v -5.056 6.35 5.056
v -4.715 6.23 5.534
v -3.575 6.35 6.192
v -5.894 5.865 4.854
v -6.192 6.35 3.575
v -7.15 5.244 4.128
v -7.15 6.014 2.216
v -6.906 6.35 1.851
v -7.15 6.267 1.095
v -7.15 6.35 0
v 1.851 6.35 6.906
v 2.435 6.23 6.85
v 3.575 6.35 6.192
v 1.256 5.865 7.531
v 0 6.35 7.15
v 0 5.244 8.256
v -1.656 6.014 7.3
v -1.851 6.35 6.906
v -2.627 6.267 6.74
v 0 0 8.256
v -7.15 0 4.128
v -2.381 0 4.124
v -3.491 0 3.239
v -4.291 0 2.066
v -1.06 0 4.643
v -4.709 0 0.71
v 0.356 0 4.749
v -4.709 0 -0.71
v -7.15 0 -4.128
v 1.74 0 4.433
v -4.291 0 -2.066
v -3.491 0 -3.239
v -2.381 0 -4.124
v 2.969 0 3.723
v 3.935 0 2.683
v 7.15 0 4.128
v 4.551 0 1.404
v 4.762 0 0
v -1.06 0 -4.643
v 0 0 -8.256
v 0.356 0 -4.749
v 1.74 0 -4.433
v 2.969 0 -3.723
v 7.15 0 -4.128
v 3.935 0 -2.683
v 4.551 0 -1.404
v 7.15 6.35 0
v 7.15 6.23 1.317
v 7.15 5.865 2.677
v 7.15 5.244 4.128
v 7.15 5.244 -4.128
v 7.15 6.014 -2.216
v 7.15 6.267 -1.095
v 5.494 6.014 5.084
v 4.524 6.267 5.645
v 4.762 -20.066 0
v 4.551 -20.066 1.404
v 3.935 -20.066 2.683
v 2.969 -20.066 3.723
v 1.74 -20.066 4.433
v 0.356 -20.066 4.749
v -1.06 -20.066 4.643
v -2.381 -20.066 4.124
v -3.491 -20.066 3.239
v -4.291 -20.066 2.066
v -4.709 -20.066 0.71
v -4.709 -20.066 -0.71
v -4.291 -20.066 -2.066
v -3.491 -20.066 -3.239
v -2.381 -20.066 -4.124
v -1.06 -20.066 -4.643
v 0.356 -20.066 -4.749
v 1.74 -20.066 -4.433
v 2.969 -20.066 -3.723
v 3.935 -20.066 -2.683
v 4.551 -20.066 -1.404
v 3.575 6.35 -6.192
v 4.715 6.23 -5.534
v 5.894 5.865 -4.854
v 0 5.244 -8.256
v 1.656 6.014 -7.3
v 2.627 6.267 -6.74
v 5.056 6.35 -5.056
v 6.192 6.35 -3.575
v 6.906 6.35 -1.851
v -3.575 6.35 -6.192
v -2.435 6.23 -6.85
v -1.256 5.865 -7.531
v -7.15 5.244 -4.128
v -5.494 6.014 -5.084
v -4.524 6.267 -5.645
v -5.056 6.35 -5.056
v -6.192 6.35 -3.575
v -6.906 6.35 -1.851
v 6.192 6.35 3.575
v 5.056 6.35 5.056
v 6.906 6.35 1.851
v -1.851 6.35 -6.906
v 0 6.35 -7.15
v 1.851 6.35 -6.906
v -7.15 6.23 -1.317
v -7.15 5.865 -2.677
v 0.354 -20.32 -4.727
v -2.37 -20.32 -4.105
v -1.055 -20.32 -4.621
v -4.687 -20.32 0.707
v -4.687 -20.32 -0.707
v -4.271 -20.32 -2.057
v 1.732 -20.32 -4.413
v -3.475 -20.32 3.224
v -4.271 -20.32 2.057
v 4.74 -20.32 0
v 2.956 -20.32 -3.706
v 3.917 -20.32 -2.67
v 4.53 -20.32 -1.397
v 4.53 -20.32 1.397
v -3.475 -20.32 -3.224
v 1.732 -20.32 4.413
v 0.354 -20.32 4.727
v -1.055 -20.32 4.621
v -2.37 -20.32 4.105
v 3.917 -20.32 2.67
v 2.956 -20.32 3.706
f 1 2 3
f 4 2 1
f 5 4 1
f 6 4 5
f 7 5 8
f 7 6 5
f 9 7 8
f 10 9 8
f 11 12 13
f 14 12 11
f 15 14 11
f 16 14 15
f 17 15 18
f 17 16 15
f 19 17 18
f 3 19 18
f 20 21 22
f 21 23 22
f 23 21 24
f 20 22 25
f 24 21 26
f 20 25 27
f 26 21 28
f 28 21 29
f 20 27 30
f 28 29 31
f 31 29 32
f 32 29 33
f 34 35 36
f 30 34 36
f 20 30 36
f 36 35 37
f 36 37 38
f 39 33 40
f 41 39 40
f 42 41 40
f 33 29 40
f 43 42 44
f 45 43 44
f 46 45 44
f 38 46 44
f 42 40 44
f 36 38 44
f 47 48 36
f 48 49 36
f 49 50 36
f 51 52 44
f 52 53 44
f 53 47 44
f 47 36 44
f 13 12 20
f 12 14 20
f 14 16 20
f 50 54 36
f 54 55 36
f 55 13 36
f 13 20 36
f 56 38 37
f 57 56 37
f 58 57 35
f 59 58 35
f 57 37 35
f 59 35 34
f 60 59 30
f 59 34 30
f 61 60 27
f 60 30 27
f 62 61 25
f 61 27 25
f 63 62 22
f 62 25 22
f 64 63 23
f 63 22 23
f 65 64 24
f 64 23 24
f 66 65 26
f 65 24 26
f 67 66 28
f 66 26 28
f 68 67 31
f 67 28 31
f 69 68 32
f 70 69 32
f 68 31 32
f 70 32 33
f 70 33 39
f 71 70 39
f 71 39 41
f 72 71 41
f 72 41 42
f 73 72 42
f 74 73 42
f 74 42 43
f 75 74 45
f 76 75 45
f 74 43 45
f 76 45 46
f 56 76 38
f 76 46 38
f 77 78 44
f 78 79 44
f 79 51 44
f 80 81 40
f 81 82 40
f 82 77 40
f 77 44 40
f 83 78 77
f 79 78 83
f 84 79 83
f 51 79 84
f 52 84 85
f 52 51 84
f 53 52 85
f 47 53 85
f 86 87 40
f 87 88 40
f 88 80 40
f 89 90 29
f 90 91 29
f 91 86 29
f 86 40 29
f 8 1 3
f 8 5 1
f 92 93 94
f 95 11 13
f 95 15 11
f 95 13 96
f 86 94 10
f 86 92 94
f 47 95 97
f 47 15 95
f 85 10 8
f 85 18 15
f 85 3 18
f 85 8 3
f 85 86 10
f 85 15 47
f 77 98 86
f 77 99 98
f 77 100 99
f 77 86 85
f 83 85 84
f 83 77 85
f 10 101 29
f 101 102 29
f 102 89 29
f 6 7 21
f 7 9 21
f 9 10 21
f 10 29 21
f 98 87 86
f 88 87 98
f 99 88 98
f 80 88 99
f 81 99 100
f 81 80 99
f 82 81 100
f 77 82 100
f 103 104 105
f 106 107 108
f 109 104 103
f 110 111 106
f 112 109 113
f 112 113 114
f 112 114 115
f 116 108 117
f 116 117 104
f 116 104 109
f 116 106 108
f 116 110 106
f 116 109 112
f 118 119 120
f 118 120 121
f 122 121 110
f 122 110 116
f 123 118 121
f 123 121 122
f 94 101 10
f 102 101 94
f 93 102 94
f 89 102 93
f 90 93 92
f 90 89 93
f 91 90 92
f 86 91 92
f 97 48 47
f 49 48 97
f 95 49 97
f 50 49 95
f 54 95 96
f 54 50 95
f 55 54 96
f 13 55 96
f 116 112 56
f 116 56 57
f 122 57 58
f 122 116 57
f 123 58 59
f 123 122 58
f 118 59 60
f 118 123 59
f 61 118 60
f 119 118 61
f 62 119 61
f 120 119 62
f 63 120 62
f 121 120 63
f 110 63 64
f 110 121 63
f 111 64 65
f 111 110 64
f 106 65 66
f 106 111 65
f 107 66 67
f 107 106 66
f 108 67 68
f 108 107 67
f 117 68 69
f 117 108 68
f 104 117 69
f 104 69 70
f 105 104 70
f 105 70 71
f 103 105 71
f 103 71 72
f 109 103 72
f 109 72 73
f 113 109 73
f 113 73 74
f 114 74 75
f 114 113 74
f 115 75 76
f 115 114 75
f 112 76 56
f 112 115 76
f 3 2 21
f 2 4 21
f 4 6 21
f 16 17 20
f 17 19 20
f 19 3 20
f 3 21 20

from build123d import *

# Parameters (mm, degrees)
BOSS_EXTRUDE1_DEPTH = 6.35
SKETCH2_R           = 4.7625
BOSS_EXTRUDE2_DEPTH = 20.32
SKETCH3_OUTSIDE_W   = 63.834
SKETCH3_OUTSIDE_H   = 66.046
SKETCH3_OUTSIDE_R   = 7.1501
CUT_EXTRUDE1_DEPTH  = 20.32
CUT_EXTRUDE1_TAPER  = 45
CHAMFER1_SIZE       = 0.254
CHAMFER1_SIZE2      = 0.022222121


with BuildPart() as part:
    # Sketch1 → Boss-Extrude1 (new body)
    with BuildSketch(Plane(origin=(0, 0, 0), x_dir=(1, 0, 0), z_dir=(0, 1, 0))):
        Polygon((0, 8.256224319), (-7.1501, 4.12811216), (-7.1501, -4.12811216), (0, -8.256224319), (7.1501, -4.12811216), (7.1501, 4.12811216), align=None)
    extrude(amount=BOSS_EXTRUDE1_DEPTH)

    # Sketch2 → Boss-Extrude2 (add)
    with BuildSketch(Plane.XZ):
        Circle(SKETCH2_R)
    extrude(amount=BOSS_EXTRUDE2_DEPTH)

    # Sketch3 outside → Cut-Extrude1 (cut)
    with BuildSketch(Plane(origin=(0, 6.35, 0), x_dir=(1, 0, 0), z_dir=(0, 1, 0))):
        Rectangle(SKETCH3_OUTSIDE_W, SKETCH3_OUTSIDE_H)
        Circle(SKETCH3_OUTSIDE_R, mode=Mode.SUBTRACT)
    extrude(amount=-CUT_EXTRUDE1_DEPTH, taper=CUT_EXTRUDE1_TAPER, mode=Mode.SUBTRACT)

    # Chamfer1
    chamfer1_edges = [part.edges().sort_by_distance(p)[0] for p in [
        (-4.7625, -20.32, 0),
    ]]
    chamfer1_side = [part.faces().sort_by_distance(p)[0] for p in [
        (-4.7625, -10.16, 0),
    ]]
    chamfer(chamfer1_edges, length=CHAMFER1_SIZE, length2=CHAMFER1_SIZE2, reference=chamfer1_side[0])


solid = part.part
